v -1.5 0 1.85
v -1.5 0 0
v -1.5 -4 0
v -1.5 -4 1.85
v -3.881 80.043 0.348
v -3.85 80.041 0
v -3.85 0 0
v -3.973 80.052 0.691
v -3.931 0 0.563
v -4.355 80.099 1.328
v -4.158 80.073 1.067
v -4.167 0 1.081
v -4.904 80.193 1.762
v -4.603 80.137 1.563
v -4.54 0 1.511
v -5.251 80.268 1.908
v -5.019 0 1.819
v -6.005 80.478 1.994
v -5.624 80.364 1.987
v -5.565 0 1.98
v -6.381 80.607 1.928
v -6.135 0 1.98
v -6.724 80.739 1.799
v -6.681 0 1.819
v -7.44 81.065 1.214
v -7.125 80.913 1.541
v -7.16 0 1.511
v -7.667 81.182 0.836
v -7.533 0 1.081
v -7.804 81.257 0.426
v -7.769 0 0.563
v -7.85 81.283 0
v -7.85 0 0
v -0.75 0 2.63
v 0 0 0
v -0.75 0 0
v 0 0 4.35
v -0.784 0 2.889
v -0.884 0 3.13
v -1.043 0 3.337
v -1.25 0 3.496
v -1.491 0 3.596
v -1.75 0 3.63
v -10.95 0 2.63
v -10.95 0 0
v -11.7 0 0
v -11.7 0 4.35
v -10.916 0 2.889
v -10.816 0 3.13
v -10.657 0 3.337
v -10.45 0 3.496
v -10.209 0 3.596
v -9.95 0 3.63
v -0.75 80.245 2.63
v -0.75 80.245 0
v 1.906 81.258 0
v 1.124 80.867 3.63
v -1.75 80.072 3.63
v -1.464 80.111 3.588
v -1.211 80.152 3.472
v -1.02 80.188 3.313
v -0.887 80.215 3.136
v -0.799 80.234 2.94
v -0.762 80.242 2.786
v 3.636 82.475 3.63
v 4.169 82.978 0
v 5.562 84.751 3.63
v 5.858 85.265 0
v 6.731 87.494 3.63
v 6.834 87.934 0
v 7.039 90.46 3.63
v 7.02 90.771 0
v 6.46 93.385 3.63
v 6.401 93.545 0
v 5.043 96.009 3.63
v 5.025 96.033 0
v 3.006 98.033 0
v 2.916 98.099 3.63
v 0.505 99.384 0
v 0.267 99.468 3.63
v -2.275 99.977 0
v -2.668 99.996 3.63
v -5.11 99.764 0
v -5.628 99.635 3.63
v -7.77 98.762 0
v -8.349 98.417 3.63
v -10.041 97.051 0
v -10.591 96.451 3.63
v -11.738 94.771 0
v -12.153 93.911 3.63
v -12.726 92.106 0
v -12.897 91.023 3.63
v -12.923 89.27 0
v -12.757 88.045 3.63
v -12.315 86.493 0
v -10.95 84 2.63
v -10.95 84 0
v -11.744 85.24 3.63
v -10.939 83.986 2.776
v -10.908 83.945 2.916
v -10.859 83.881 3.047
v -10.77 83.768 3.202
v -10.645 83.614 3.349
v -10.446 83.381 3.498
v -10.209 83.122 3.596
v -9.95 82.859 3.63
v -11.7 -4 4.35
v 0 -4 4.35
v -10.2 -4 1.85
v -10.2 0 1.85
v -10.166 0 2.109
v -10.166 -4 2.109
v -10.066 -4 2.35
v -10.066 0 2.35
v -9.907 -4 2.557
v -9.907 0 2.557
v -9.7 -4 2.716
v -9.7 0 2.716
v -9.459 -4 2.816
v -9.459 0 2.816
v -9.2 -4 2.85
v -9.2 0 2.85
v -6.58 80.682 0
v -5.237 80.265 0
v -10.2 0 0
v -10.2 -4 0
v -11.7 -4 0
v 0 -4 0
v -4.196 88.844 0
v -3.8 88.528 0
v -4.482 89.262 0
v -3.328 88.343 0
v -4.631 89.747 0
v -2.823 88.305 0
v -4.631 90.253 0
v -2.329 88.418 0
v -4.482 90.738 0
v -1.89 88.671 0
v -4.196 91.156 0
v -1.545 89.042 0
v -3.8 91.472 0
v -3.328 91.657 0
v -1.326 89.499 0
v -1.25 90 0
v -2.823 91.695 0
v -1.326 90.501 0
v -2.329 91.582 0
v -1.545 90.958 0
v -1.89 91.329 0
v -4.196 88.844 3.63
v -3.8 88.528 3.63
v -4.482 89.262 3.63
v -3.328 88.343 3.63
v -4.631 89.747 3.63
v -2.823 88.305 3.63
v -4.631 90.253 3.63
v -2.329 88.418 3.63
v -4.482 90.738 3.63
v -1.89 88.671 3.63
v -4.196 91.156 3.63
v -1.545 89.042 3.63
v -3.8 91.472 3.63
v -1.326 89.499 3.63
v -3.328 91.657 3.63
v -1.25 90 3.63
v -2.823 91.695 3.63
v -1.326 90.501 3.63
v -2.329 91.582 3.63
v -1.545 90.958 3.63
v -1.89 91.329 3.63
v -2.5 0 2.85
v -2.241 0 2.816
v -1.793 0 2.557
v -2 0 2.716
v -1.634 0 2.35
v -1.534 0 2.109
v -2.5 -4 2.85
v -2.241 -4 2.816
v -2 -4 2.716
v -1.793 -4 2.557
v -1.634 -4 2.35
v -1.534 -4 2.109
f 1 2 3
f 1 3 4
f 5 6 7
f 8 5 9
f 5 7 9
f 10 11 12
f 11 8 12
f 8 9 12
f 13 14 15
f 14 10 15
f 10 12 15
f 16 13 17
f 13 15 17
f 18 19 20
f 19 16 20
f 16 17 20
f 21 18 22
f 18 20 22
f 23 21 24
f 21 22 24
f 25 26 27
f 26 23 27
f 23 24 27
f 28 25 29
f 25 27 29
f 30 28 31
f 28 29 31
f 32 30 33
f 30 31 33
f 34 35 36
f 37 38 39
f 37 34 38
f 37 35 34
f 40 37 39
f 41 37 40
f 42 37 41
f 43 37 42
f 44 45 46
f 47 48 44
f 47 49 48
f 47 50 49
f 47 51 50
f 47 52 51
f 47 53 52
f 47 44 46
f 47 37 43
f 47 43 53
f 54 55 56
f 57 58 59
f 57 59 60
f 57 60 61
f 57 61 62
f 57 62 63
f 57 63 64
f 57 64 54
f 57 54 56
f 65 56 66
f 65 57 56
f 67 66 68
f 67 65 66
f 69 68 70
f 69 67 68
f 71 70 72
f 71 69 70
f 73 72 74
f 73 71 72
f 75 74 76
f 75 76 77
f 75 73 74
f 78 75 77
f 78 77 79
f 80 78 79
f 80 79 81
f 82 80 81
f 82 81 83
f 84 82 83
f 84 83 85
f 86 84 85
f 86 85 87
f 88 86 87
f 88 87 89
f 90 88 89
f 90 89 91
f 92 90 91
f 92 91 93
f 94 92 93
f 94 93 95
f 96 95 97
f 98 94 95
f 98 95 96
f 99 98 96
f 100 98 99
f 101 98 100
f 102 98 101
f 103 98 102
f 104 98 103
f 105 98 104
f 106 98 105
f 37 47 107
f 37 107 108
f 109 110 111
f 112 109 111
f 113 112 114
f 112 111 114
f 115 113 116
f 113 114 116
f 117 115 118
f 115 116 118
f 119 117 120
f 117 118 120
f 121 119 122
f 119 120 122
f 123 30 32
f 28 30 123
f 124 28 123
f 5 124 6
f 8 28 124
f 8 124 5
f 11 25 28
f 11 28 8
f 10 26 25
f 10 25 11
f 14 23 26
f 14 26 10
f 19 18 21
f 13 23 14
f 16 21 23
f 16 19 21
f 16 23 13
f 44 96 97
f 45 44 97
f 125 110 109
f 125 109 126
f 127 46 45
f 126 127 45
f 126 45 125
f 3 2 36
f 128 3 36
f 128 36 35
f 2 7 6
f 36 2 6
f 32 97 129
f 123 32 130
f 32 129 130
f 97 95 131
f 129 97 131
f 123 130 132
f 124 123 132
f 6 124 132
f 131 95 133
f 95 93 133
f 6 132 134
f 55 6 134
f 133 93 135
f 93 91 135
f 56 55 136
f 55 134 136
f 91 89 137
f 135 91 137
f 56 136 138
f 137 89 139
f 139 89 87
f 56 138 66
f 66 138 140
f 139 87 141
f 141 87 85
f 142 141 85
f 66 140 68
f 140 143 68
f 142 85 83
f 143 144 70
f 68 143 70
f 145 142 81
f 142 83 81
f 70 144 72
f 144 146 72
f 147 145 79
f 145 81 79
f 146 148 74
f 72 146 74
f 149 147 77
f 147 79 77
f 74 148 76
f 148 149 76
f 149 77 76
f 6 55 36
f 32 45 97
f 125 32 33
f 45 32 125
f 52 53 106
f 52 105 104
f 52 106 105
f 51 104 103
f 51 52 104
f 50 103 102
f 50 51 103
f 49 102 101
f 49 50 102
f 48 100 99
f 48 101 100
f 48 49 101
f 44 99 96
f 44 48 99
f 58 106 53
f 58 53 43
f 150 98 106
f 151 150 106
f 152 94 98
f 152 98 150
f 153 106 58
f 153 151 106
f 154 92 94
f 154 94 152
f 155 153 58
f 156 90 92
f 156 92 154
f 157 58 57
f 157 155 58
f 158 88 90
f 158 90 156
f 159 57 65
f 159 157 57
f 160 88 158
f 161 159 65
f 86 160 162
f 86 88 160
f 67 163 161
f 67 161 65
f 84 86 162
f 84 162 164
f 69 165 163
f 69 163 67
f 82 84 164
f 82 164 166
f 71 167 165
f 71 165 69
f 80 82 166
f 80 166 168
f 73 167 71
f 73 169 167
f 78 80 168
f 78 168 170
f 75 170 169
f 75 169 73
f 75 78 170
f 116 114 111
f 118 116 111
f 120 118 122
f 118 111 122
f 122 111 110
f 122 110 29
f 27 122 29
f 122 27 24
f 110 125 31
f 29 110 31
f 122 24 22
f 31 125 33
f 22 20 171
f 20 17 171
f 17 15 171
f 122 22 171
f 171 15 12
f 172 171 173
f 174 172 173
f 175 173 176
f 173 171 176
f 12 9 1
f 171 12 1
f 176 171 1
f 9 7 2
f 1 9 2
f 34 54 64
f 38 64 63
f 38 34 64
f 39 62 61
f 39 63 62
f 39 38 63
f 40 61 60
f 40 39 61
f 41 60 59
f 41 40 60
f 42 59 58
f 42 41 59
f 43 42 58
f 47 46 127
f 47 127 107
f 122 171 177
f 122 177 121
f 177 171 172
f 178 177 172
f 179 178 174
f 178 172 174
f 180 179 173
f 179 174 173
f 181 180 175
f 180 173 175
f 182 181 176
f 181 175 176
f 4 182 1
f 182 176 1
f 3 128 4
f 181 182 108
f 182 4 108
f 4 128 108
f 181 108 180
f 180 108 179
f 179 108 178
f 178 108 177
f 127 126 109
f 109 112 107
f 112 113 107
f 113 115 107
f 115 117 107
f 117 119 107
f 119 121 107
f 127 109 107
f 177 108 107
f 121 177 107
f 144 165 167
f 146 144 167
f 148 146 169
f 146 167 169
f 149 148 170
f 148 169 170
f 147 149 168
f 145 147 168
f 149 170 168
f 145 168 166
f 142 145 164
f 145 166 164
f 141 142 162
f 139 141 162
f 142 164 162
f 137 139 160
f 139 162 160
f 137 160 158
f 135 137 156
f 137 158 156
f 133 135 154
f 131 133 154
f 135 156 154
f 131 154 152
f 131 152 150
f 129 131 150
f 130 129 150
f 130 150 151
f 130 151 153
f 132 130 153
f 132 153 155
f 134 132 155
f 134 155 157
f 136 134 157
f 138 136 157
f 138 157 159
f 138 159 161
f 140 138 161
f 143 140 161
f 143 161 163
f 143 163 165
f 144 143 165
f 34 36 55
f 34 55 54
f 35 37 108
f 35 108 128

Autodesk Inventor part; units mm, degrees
ref_plane "YZ Plane" through (0, 0, 0) normal (1, 0, 0) x (0, 1, 0)
ref_plane "XZ Plane" through (0, 0, 0) normal (0, 1, 0) x (-1, 0, 0)
ref_plane "XY Plane" through (0, 0, 0) normal (0, 0, 1) x (1, 0, 0)
sketch "Sketch1" plane through (0, 0, 0) normal (0, 1, 0) x (-1, 0, 0)
  line L0 (10.2, -1.85) -> (10.2, 0) projected
  line L1 (10.2, 0) -> (11.7, 0) projected
  line L2 (11.7, 0) -> (11.7, -4.35) projected
  line L3 (11.7, -4.35) -> (0, -4.35) projected
  line L4 (0, -4.35) -> (0, 0) projected
  line L5 (0, 0) -> (1.5, 0) projected
  line L6 (1.5, 0) -> (1.5, -1.85) projected
  arc A0 (1.5, -1.85) -> (2.5, -2.85) centre (2.5, -1.85) ccw projected
  line L7 (2.5, -2.85) -> (9.2, -2.85) projected
  arc A1 (9.2, -2.85) -> (10.2, -1.85) centre (9.2, -1.85) ccw projected
  line L8 (10.2, 1.85) -> (10.2, 0)
  line L9 (11.7, 0) -> (11.7, 4.35)
  line L10 (11.7, 4.35) -> (0, 4.35)
  line L11 (0, 4.35) -> (0, 0)
  line L12 (1.5, 0) -> (1.5, 1.85)
  arc A2 (2.5, 2.85) -> (1.5, 1.85) centre (2.5, 1.85) ccw
  line L13 (2.5, 2.85) -> (9.2, 2.85)
  arc A3 (10.2, 1.85) -> (9.2, 2.85) centre (9.2, 1.85) ccw
extrude "Extrusion1" add sketch "Sketch1" against normal blind 4 contours L8 A3 L13 A2 L12 L5 L11 L10 L9 L1
sketch "Sketch2" plane through (0, 0, 0) normal (0, 1, 0) x (1, 0, 0)
  line L0 (-0.75, 0) -> (-0.75, 2.63) projected
  arc A0 (-0.75, 2.63) -> (-1.75, 3.63) centre (-1.75, 2.63) ccw projected
  line L1 (-1.75, 3.63) -> (-9.95, 3.63) projected
  arc A1 (-9.95, 3.63) -> (-10.95, 2.63) centre (-9.95, 2.63) ccw projected
  line L2 (-10.95, 2.63) -> (-10.95, 0) projected
  line L3 (-10.95, 0) -> (-0.75, 0) projected
  line L4 (-0.75, 0) -> (-0.75, -2.63)
  arc A2 (-1.75, -3.63) -> (-0.75, -2.63) centre (-1.75, -2.63) ccw
  line L5 (-1.75, -3.63) -> (-9.95, -3.63)
  arc A3 (-10.95, -2.63) -> (-9.95, -3.63) centre (-9.95, -2.63) ccw
  line L6 (-10.95, -2.63) -> (-10.95, 0)
  arc A4 (-7.85, 0) -> (-3.85, 0) centre (-5.85, 0) ccw
  point P0 (0, 0)
  dimension "d2" = 2
extrude "Extrusion2" add sketch "Sketch2" along normal blind 85 contours L4 A2 L5 A3 L6 L3 A4
sketch "Sketch3" plane through (0, 85, 0) normal (0, 1, 0) x (1, 0, 0)
  point P0 (0, 0)
sketch "Sketch4" plane through (-9.95, 0, 3.63) normal (0, 0, 1) x (1, 0, 0)
  circle A0 centre (7, 90) radius 10
  line L0 (-1.75, 0) -> (9.95, 0) projected
  line L1 (9.2, 0) -> (9.2, 85) projected
  line L2 (-1, 0) -> (-1, 85) projected
  dimension "d6" = 20
  dimension "d12" = 90
  dimension "d14" = 8
extrude "Extrusion3" add sketch "Sketch4" against normal up to surface (3.63 mm away) contours A0
sketch "Sketch5" plane through (-9.95, 0, 3.63) normal (0, 0, 1) x (1, 0, 0)
  circle A0 centre (7, 90) radius 1.7
  circle A1 centre (7, 90) radius 10 projected
  point P0 (9.95, 0)
  point P1 (0, 82.8586)
  point P2 (8.2, 80.0723)
  dimension "d9" = 3.4
extrude "Extrusion4" cut sketch "Sketch5" against normal blind 120 contours A0
properties part number "microphone2"
